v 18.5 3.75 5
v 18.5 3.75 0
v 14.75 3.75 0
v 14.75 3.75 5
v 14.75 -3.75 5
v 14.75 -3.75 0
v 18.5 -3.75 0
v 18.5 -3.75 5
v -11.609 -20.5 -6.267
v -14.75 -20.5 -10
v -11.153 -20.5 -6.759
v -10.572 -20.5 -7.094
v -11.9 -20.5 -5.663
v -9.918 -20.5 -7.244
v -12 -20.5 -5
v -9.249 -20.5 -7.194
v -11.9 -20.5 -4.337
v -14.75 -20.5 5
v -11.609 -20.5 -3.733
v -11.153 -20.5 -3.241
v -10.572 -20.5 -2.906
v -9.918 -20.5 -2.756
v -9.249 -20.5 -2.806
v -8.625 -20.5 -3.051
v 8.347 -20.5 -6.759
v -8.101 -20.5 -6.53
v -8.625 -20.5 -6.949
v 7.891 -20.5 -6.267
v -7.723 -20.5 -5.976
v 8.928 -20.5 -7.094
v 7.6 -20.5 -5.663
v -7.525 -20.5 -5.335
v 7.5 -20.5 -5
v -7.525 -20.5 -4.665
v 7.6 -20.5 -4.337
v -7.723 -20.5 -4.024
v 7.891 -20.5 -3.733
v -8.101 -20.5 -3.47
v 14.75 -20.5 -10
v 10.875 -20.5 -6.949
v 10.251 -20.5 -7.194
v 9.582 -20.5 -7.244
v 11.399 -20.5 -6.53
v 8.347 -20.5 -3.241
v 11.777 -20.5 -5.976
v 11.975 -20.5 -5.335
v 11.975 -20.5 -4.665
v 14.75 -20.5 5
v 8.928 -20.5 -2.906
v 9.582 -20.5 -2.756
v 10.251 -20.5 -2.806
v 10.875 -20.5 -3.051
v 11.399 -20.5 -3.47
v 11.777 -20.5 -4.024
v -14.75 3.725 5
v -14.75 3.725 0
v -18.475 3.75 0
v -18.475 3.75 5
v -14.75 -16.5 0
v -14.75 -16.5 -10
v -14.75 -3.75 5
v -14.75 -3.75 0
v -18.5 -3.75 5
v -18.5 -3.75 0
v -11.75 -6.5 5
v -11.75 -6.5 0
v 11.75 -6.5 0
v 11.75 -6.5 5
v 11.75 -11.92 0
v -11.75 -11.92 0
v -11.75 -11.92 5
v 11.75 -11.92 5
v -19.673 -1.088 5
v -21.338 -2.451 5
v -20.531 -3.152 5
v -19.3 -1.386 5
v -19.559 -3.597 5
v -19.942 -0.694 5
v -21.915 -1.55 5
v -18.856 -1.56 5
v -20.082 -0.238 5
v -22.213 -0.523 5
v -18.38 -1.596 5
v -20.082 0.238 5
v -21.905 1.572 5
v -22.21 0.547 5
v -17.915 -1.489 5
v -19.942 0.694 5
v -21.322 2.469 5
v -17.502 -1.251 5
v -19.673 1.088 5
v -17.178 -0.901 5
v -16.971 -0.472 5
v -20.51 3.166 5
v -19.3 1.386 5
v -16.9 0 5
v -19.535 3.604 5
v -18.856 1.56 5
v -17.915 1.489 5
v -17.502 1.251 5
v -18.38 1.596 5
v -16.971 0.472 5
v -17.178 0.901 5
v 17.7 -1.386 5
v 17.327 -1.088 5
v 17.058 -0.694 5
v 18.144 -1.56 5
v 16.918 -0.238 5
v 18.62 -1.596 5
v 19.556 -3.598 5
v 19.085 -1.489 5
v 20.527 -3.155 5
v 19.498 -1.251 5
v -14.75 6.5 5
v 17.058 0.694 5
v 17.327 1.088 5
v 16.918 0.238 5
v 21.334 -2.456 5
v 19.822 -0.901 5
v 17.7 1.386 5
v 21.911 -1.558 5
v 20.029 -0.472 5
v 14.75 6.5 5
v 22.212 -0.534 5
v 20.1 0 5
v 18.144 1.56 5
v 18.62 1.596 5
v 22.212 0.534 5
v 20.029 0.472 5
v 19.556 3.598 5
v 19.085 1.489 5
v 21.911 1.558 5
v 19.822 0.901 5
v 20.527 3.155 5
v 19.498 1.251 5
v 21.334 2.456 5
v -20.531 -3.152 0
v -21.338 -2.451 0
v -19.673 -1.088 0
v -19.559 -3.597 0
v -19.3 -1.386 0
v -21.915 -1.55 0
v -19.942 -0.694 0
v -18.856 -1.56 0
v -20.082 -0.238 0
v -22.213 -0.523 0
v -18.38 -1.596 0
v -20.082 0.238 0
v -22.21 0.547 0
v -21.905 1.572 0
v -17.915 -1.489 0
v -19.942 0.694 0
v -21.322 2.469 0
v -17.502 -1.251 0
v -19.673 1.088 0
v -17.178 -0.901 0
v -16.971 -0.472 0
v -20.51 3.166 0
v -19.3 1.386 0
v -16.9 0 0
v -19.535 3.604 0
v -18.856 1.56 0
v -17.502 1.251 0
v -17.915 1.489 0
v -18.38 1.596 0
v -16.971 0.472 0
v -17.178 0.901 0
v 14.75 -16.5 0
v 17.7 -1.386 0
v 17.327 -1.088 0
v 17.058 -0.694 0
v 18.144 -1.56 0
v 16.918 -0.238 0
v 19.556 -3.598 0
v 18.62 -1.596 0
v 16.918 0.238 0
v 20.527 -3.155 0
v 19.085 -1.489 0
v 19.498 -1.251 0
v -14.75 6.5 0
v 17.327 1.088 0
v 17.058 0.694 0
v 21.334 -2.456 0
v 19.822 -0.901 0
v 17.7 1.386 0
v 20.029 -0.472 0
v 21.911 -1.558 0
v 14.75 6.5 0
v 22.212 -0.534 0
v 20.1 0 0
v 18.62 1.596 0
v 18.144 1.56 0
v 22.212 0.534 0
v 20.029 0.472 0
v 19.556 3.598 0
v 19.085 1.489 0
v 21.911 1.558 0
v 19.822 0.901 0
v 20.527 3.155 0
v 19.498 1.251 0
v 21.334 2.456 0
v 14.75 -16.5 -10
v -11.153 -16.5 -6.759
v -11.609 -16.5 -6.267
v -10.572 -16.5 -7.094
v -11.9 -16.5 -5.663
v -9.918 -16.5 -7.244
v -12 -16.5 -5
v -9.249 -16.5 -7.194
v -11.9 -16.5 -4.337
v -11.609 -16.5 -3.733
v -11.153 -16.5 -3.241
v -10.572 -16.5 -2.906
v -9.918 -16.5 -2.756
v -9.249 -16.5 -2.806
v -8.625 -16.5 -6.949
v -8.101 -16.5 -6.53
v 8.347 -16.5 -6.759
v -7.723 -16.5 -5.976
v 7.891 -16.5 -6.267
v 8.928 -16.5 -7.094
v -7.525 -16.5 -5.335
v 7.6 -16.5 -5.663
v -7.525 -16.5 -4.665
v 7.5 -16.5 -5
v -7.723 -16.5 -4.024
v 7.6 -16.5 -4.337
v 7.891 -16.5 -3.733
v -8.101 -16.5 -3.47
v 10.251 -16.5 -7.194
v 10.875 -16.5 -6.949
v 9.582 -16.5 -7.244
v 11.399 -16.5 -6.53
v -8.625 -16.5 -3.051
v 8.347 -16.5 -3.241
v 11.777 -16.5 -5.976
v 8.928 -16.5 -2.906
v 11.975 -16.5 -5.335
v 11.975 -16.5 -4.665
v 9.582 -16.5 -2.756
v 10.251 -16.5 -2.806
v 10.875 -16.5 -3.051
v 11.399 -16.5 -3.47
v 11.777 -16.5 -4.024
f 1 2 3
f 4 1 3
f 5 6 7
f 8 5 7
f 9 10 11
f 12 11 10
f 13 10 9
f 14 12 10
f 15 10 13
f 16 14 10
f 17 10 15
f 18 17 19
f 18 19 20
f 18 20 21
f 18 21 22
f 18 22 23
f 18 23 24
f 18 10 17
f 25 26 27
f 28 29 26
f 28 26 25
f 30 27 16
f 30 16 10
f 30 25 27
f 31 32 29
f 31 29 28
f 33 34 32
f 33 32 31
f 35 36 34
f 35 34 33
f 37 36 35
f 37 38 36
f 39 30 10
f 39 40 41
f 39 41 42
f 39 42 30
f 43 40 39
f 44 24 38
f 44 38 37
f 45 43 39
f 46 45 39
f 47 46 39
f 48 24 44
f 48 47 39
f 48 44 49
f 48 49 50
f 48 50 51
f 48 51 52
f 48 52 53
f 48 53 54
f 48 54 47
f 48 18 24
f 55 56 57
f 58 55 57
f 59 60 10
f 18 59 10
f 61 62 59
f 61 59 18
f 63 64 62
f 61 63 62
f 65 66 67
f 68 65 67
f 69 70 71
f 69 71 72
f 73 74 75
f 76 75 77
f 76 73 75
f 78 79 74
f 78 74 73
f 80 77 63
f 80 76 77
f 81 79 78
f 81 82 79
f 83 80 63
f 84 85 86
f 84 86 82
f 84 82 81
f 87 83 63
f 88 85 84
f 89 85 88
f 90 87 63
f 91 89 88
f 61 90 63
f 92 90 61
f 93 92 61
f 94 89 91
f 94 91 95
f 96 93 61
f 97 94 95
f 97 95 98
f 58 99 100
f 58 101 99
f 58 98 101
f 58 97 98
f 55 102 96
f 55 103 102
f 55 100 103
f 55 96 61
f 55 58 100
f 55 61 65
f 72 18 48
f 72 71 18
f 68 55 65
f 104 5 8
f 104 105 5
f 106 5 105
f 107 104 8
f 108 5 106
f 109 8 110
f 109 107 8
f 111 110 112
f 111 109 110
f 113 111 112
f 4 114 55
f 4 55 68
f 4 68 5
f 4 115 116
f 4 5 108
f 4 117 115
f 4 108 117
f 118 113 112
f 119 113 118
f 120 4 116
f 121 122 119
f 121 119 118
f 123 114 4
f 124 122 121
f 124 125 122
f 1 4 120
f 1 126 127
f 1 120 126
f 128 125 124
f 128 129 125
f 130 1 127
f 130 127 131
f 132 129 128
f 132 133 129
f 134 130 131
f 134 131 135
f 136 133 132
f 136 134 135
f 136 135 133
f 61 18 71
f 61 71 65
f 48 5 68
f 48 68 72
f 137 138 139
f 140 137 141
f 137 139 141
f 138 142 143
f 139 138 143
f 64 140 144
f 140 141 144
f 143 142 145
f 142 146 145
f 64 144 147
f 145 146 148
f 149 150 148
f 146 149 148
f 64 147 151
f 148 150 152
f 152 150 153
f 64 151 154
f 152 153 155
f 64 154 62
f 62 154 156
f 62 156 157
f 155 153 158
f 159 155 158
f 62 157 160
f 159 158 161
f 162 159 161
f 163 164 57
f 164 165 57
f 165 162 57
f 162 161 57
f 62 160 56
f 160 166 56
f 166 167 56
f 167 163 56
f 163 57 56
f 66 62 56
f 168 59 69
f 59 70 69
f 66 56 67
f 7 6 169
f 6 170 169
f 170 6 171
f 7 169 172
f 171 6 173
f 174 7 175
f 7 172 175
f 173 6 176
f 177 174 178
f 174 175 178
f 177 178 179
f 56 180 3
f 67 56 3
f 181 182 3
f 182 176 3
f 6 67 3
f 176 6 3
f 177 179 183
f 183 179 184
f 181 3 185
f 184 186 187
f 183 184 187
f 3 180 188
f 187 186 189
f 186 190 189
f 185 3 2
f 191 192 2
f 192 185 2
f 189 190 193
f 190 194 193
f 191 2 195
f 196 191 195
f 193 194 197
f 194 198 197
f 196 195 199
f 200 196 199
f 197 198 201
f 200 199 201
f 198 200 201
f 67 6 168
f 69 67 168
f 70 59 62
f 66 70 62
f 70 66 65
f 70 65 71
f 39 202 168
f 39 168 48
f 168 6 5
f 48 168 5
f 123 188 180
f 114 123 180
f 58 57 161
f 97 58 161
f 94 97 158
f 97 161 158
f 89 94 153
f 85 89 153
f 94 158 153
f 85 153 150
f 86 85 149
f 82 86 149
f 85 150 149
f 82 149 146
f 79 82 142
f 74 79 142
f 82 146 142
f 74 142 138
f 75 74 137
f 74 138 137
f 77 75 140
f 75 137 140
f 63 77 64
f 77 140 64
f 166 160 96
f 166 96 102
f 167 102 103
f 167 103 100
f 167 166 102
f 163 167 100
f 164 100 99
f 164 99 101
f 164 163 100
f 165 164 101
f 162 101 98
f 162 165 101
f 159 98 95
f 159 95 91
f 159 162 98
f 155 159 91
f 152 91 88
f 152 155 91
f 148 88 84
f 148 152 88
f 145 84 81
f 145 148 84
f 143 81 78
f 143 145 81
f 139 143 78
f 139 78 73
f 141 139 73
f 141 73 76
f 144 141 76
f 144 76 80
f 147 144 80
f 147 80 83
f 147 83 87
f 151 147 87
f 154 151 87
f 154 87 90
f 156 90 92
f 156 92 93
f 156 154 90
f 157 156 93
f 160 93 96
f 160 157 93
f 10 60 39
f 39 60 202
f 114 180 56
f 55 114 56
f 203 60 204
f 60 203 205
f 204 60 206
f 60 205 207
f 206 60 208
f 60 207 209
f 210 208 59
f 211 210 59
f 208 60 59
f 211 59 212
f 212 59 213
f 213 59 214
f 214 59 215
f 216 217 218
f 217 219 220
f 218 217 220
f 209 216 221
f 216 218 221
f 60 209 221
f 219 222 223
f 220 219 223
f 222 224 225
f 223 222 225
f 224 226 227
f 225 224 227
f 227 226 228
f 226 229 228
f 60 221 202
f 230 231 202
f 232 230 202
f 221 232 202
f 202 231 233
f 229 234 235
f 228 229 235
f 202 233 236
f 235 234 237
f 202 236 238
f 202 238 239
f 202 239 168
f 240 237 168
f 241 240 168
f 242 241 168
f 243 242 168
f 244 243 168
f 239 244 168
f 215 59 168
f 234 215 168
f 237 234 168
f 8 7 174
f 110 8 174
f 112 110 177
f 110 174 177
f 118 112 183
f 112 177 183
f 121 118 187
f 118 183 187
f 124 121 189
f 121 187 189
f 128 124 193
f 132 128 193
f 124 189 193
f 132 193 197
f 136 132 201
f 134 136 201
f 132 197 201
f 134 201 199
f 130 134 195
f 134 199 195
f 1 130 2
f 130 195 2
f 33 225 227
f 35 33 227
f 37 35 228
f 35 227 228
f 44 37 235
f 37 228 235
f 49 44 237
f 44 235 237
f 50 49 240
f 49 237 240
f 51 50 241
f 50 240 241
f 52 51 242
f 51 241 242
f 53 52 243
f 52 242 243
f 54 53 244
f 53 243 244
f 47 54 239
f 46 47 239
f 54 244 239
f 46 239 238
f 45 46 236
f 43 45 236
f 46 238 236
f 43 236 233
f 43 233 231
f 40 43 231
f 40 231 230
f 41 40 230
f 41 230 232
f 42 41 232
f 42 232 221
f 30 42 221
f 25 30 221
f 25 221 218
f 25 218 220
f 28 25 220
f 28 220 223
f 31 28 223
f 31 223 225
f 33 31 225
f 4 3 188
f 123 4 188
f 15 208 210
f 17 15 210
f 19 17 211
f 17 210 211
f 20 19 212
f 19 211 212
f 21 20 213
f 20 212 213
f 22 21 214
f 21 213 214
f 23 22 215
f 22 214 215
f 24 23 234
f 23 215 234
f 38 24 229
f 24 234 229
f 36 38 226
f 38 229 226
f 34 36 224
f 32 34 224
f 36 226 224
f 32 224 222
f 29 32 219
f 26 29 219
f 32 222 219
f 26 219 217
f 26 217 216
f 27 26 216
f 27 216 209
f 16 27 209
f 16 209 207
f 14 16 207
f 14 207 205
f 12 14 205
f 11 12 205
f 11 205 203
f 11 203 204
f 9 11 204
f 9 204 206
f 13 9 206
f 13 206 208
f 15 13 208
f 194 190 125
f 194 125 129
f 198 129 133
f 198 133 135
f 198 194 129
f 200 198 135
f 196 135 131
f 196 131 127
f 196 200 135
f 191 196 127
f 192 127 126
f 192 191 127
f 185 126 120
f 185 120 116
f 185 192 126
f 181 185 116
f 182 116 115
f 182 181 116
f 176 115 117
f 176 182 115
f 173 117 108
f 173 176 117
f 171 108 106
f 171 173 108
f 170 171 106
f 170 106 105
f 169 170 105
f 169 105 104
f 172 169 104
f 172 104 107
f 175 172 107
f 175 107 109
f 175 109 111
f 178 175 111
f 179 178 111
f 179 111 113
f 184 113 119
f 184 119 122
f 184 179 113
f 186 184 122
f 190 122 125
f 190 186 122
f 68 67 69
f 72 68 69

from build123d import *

# Parameters (mm, degrees)
F0_R     = 1.6
F1_DEPTH = 5
F2_W     = 29.5
F2_H     = 5
F3_DEPTH = 10
F4_W     = 29.5
F4_H     = 15
F5_DEPTH = 4
F6_R     = 2.25
F7_DEPTH = 25
F8_W     = 23.5
F8_H     = 5.420308
F9_DEPTH = 25


with BuildPart() as f1:
    # F0 (on Top) → F1 (new body)
    with BuildSketch(Plane.XY):
        with BuildLine():
            Line((14.75, 6.5), (-14.75, 6.5))
            Line((-14.75, 6.5), (-14.75, 3.725468))
            Line((-14.75, 3.725468), (-14.75, -3.75))
            Line((-14.75, -3.75), (-14.75, -6.5))
            Line((-14.75, -6.5), (14.75, -6.5))
            Line((14.75, -6.5), (14.75, -3.75))
            Line((14.75, -3.75), (18.5, -3.75))
            ThreePointArc((18.5, -3.75), (22.25, 0), (18.5, 3.75))
            Line((18.5, 3.75), (14.75, 3.75))
            Line((14.75, 3.75), (14.75, 6.5))
        make_face()
        with Locations((18.5, 0)):
            Circle(F0_R, mode=Mode.SUBTRACT)
        with BuildLine():
            Line((-14.75, -3.75), (-14.75, 3.725468))
            Line((-14.75, 3.725468), (-18.475388, 3.749919))
            ThreePointArc((-18.475388, 3.749919), (-22.24998, 0.012306), (-18.5, -3.75))
            Line((-18.5, -3.75), (-14.75, -3.75))
        make_face()
        with Locations((-18.5, 0)):
            Circle(F0_R, mode=Mode.SUBTRACT)
    extrude(amount=F1_DEPTH)

    # F2 (on face) → F3 (join)
    with BuildSketch(Plane.XZ.offset(6.5)):
        with Locations((0, 2.5)):
            Rectangle(F2_W, F2_H)
    extrude(amount=F3_DEPTH)

    # F4 (on face) → F5 (join)
    with BuildSketch(Plane.XZ.offset(16.5)):
        with Locations((0, -2.5)):
            Rectangle(F4_W, F4_H)
    extrude(amount=F5_DEPTH)

    # F6 (on face) → F7 (cut)
    with BuildSketch(Plane(origin=(0, -16.5, 0), x_dir=(-1, 0, 0), z_dir=(0, 1, 0))):
        with Locations((-9.75, -5)):
            Circle(F6_R)
        with Locations((9.75, -5)):
            Circle(F6_R)
    extrude(amount=-F7_DEPTH, mode=Mode.SUBTRACT)

    # F8 (on face) → F9 (cut)
    with BuildSketch(Plane(origin=(0, 0, 0), x_dir=(1, 0, 0), z_dir=(0, 0, -1))):
        with Locations((0, 9.210154)):
            Rectangle(F8_W, F8_H)
    extrude(amount=-F9_DEPTH, mode=Mode.SUBTRACT)


solid = f1.part
